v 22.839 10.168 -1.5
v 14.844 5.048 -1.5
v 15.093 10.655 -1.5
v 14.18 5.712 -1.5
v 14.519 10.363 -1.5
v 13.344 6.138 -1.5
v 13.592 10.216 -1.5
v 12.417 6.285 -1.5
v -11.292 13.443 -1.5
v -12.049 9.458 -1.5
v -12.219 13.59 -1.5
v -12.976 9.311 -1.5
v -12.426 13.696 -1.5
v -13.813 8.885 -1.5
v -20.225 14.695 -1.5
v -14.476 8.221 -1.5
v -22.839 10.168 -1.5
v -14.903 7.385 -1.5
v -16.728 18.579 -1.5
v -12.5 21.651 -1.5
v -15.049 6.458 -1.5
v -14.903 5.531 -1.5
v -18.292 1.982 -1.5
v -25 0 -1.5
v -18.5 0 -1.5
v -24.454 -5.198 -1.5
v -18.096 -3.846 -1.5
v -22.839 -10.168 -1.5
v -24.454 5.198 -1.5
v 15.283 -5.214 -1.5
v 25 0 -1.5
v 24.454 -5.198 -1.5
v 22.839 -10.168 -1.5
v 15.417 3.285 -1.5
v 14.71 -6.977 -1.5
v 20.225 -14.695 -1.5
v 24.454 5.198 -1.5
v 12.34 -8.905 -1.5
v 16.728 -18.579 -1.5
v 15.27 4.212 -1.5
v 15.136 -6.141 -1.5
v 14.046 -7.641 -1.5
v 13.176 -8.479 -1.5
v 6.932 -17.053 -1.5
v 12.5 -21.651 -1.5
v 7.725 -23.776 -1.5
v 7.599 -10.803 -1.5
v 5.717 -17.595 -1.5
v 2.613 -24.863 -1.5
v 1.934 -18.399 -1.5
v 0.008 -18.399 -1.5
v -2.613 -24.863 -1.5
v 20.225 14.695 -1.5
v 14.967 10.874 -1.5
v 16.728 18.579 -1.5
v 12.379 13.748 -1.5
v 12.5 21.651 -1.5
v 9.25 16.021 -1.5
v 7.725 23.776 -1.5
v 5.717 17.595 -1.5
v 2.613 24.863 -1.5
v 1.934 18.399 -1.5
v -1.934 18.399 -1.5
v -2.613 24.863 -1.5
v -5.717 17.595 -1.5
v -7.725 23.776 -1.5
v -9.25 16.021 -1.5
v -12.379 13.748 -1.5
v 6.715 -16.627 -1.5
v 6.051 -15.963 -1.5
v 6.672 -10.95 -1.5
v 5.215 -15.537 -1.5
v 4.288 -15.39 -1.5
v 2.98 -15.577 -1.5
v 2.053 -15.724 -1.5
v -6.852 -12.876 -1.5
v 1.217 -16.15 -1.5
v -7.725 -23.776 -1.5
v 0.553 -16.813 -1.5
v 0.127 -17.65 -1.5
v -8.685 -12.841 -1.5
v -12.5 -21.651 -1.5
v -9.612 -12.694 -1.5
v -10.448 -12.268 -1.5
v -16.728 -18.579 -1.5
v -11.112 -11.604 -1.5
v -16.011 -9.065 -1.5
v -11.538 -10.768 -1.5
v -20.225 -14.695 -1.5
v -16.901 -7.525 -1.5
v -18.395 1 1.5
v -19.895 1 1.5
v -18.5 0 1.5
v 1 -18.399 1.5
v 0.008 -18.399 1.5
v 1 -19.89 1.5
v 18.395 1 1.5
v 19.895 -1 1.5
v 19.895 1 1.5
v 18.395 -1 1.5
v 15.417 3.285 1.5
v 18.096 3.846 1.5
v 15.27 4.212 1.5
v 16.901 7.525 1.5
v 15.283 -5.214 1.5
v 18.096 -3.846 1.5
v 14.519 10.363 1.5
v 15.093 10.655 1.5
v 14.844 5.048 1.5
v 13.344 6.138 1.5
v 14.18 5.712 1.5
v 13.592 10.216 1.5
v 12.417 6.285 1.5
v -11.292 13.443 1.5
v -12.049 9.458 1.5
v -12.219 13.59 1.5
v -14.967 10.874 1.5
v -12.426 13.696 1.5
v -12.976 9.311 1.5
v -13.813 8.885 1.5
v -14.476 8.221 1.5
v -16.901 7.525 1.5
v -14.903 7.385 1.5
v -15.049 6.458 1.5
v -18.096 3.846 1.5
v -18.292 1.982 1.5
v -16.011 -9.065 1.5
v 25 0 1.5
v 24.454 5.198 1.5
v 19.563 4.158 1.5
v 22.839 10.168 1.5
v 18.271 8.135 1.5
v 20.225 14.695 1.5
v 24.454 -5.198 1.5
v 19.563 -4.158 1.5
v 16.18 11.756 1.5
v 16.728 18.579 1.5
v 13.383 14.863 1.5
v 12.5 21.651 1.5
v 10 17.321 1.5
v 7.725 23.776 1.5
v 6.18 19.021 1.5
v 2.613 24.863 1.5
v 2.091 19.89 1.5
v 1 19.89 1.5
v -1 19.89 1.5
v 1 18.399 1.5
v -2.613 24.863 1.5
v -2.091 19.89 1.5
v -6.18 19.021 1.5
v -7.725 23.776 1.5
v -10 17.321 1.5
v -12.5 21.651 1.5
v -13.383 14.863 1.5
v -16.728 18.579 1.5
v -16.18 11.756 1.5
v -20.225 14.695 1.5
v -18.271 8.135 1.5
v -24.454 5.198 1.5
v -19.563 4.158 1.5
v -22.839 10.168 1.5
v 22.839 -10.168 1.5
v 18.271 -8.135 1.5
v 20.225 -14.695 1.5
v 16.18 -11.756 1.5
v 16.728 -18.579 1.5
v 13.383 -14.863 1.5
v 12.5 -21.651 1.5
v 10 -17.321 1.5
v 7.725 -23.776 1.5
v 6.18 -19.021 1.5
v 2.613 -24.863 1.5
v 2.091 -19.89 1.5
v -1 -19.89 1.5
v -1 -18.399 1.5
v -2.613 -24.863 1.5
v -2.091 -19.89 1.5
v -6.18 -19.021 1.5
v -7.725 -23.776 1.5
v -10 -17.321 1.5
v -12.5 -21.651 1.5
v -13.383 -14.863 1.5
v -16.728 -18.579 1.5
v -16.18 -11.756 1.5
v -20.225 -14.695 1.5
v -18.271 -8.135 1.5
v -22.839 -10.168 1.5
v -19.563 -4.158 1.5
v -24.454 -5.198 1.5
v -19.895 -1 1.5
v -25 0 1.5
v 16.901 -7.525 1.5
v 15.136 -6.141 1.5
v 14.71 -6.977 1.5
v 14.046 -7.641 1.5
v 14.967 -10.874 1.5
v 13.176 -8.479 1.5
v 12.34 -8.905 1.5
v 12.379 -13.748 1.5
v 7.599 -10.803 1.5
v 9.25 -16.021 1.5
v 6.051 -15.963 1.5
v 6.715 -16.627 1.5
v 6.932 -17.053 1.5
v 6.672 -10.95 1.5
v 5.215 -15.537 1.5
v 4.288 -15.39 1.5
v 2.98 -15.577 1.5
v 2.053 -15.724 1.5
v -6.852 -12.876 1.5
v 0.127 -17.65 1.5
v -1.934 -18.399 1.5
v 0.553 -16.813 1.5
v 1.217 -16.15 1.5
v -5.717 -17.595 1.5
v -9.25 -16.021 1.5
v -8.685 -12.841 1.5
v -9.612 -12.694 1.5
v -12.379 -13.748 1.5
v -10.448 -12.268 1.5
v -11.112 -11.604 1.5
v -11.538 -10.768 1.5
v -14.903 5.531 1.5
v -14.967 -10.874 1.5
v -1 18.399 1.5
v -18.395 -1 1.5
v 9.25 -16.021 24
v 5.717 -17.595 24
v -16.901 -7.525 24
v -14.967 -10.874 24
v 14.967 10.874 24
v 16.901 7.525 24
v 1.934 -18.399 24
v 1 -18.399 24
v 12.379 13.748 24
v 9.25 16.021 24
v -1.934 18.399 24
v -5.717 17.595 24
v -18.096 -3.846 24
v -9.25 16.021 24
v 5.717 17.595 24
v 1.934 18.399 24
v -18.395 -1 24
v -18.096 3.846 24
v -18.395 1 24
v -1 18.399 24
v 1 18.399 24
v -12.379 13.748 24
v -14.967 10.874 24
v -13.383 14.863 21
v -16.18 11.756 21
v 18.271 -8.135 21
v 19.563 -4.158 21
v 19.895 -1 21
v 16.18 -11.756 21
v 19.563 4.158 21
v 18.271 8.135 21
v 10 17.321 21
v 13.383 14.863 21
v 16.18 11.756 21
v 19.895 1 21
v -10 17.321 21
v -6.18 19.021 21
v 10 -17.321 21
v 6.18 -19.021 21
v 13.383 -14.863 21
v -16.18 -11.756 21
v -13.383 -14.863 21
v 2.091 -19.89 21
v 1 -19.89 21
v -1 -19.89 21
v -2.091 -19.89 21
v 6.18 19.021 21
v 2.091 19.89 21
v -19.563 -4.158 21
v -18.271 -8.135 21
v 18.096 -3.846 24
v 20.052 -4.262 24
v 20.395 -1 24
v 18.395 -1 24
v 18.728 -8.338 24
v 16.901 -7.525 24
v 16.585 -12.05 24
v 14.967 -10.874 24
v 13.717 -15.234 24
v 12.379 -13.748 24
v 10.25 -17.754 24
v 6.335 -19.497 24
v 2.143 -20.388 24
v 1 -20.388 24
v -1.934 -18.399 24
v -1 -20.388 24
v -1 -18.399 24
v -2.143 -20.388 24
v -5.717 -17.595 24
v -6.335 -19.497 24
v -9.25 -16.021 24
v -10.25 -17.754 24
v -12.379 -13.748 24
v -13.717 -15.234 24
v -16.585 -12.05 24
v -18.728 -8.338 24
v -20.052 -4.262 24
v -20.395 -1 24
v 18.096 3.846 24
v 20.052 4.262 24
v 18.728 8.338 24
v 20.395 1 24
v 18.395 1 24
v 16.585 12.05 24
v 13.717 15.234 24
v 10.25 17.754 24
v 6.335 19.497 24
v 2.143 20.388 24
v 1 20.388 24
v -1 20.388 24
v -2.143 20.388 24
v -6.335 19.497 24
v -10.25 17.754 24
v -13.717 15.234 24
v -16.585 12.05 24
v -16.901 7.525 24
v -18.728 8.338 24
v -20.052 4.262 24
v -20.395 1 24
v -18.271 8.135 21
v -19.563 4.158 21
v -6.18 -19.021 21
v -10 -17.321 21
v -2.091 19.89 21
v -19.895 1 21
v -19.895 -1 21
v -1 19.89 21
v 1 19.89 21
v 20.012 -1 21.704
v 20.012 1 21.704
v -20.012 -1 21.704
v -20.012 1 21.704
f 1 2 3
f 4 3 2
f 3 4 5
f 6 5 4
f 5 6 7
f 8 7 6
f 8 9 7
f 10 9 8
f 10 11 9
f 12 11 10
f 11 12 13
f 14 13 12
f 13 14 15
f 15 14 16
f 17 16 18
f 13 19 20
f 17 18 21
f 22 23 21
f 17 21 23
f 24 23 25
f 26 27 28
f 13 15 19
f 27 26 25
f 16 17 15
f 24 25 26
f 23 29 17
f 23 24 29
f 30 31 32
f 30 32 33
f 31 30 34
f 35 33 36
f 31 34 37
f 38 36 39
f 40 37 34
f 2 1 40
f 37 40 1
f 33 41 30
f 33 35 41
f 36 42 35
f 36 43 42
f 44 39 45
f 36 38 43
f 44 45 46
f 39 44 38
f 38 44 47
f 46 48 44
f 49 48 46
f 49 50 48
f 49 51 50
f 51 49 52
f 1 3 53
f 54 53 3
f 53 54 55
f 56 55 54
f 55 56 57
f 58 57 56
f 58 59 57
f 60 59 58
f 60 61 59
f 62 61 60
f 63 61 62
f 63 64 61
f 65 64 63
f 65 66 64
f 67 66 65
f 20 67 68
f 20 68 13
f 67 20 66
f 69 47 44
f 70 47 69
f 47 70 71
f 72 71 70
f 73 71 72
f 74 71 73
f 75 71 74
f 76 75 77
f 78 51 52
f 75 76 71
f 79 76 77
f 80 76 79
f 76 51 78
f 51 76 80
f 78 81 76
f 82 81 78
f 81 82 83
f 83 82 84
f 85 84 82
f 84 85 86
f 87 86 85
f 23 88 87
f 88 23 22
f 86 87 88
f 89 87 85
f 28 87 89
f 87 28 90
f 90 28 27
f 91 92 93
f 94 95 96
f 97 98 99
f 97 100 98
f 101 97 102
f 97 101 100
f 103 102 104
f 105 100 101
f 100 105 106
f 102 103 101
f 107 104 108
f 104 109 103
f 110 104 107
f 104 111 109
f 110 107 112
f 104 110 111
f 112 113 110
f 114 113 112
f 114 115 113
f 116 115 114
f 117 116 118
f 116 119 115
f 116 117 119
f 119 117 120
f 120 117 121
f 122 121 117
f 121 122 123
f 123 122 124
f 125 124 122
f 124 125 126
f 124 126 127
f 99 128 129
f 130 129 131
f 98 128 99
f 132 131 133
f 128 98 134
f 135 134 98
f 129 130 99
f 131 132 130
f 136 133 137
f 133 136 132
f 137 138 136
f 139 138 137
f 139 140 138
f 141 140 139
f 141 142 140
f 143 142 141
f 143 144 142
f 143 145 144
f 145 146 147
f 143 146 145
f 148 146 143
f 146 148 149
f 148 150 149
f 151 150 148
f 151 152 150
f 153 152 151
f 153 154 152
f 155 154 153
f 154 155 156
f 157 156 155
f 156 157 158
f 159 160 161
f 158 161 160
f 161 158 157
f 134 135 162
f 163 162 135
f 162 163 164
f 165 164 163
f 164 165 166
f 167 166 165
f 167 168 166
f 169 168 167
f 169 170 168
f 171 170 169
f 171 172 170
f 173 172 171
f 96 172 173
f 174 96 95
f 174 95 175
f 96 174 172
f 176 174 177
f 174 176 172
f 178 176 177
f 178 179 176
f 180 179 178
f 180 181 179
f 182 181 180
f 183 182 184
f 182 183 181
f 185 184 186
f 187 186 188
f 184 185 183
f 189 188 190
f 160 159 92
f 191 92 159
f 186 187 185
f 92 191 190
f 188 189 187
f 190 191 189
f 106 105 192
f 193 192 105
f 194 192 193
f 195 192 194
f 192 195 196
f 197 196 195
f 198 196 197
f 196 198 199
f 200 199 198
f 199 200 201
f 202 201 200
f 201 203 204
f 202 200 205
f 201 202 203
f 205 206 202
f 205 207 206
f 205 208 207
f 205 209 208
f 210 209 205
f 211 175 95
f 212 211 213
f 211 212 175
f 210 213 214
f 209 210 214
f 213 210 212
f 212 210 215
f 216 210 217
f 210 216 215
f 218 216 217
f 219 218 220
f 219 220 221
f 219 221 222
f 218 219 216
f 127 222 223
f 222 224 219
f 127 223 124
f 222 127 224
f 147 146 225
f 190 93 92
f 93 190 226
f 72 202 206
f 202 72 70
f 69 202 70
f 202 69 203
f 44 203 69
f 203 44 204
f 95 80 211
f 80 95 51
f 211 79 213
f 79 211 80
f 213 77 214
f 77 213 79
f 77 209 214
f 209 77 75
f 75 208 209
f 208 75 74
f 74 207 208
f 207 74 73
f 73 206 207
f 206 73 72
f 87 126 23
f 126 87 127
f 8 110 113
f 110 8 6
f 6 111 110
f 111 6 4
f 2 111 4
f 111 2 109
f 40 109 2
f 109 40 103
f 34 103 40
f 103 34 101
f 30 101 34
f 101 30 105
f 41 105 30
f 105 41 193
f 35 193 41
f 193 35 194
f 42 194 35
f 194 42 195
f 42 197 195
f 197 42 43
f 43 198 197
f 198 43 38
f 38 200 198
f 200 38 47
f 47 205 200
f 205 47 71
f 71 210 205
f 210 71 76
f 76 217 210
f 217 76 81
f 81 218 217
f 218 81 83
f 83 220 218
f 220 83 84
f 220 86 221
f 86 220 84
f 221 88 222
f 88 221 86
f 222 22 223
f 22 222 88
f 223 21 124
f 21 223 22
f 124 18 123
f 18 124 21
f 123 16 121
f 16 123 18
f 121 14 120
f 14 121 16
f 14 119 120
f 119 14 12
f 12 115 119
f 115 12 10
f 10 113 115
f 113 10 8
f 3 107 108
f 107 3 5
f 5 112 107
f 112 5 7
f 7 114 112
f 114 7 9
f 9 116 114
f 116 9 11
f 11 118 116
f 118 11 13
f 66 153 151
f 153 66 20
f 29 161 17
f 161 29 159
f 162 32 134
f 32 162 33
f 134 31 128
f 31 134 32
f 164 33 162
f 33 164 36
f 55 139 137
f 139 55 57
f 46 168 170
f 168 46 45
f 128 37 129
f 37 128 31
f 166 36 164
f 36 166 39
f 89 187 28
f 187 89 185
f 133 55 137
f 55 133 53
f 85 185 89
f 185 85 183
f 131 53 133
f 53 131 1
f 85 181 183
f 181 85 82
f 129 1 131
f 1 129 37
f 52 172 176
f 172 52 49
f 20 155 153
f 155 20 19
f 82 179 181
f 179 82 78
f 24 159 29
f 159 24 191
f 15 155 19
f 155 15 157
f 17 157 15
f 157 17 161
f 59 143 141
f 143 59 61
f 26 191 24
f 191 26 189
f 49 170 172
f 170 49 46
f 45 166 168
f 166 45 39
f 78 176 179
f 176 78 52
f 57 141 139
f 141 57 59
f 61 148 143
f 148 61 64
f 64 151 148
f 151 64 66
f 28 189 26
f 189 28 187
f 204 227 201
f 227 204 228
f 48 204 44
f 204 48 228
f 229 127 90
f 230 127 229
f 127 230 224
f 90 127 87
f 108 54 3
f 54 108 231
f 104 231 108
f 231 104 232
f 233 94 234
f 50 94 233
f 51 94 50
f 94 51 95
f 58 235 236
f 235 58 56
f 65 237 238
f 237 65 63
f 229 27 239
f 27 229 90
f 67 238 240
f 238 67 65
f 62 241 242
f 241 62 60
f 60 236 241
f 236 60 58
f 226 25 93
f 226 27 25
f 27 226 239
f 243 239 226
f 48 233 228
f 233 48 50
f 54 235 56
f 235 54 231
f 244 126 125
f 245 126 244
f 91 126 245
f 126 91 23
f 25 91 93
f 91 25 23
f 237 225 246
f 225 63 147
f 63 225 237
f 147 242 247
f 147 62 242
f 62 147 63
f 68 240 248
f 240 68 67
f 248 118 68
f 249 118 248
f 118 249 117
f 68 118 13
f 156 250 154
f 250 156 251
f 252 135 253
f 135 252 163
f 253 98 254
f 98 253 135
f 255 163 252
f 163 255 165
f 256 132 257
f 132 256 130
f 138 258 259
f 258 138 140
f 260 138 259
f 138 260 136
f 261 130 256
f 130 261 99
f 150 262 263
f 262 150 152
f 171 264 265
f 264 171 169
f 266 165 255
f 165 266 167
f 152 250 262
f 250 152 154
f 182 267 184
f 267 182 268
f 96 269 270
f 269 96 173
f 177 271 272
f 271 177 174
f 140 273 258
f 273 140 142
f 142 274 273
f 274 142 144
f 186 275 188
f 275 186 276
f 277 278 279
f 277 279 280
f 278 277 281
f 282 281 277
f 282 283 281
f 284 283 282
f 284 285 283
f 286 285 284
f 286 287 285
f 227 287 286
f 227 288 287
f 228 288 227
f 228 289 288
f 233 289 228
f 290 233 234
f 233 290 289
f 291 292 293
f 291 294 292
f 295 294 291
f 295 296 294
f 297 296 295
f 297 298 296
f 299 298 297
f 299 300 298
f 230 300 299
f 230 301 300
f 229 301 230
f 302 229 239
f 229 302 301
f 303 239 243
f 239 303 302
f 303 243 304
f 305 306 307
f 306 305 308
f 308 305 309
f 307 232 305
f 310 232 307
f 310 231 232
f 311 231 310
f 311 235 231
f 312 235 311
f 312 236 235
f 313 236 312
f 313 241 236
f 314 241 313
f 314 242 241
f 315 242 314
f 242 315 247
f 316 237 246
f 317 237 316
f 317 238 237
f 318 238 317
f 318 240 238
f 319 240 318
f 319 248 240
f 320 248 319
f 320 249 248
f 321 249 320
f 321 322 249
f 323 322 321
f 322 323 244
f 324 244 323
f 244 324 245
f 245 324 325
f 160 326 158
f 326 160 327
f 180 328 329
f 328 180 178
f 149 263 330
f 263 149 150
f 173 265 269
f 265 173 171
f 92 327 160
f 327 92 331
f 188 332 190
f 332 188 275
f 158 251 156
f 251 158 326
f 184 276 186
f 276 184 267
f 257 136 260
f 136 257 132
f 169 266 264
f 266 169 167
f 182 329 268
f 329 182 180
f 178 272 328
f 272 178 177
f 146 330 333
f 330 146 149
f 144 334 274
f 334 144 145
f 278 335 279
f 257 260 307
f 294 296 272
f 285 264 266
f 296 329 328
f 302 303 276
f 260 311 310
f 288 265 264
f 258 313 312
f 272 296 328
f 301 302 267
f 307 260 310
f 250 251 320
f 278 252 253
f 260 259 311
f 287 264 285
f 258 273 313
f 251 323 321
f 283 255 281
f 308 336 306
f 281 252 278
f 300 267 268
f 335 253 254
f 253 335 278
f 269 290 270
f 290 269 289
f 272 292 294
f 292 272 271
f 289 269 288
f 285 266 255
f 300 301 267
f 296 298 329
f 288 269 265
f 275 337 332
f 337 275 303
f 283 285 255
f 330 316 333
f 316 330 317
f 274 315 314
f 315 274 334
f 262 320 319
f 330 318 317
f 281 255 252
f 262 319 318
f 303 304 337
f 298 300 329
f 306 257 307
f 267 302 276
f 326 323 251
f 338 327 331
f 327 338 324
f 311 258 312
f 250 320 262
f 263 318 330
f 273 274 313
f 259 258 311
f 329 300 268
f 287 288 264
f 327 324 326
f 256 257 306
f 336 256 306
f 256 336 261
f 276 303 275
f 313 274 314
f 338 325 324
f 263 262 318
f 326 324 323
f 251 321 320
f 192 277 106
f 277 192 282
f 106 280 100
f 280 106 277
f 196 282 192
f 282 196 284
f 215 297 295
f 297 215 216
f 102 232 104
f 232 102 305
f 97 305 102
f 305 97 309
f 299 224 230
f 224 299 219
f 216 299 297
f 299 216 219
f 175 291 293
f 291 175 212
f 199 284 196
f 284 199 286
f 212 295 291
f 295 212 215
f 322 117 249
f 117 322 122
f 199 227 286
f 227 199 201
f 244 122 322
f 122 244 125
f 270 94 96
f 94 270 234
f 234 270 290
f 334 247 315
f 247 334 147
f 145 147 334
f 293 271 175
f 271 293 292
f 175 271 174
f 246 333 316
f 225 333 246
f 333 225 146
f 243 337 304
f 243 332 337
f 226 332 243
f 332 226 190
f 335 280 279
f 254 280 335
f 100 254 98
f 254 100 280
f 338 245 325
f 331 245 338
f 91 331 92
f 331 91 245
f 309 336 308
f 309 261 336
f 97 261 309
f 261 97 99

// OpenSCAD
// Opening of your vent
ventopening = 40;
// Thickness of the material through which the vent goes
materialthickness = 18;
// Size of the border frame outside the vent
border = 5;
// Thickness of the walls
wallthickness = 3;
// Size of the ring that snaps the vent in place
snapringthickness = 1;
// Seed in case you want to have a specific pattern
seed =  undef;

rotate([180,0,0])
union () {
  difference() {
    cylinder(d=ventopening + border,h=wallthickness,center=true);
    translate([0,0,-2*wallthickness]) linear_extrude(5*wallthickness)
      random_voronoi(n = pow(ventopening/9,2), nuclei = false, L = ventopening, thickness = 2, round = 3, min = 0, max = 100, seed = seed, center = true);
  }
  difference() {
    cylinder(d=ventopening+2*border, h=wallthickness,center=true);
    cylinder(d=ventopening-wallthickness, h=wallthickness+1,center=true);
  }

  translate([0, 0, -0.5*(materialthickness+2*wallthickness)])
    difference() {
      union() {
        cylinder(d=ventopening, h=(materialthickness+2*wallthickness),center=true);
        translate([0,0,-0.5*(materialthickness+2*wallthickness)+0.5*wallthickness])
          cylinder(d2=ventopening,d1=ventopening+snapringthickness, h=wallthickness,center=true);
      }
      cylinder(d=ventopening-wallthickness, h=(materialthickness+2*wallthickness)+1,center=true);
      cube([2,ventopening+2*border,(materialthickness+2*wallthickness)+1],center=true);
      cube([ventopening+2*border,2,(materialthickness+2*wallthickness)+1],center=true);
    }


}


// (c)2013 Felipe Sanches <juca@members.fsf.org>
// licensed under the terms of the GNU GPL version 3 (or later)

function normalize(v) = v / (sqrt(v[0] * v[0] + v[1] * v[1]));

//
// The voronoi() function generates a 2D surface, which can be provided to
// a) linear_extrude() to produce a 3D object
// b) intersection() to restrict it to a a specified shape -- see voronoi_polygon.scad
//
// Parameters:
//   points (required) ... nuclei coordinates (array of [x, y] pairs)
//   L                 ... the radius of the "world" (the pattern is built within this circle)
//   thickness         ... the thickness of the lines between cells
//   round             ... the radius applied to corners (fillet in CAD terms)
//   nuclei (bool)     ... show nuclei sites
//
// These parameters need to be kept more or less in proportion to each other, and to the distance
// apart of points in the point_set. If one or the other parameter is increased or decreased too
// much, you'll get no output.
//
module voronoi(points, L = 200, thickness = 1, round = 6, nuclei = true) {
	for (p = points) {
		difference() {
			minkowski() {
				intersection_for(p1 = points){
					if (p != p1) {
						angle = 90 + atan2(p[1] - p1[1], p[0] - p1[0]);

						translate((p + p1) / 2 - normalize(p1 - p) * (thickness + round))
						rotate([0, 0, angle])
						translate([-L, -L])
						square([2 * L, L]);
					}
				}
				circle(r = round, $fn = 20);
			}
			if (nuclei)
				translate(p) circle(r = 1, $fn = 20);
		}
	}
}

//
// The random_voronoi() function is the helper wrapper over the voronoi() core.
// It generates random nuclei site coordinates into the square area,
// passing other arguments to voronoi() unchanged.
//
// Parameters:
//   n                 ... number of nuclei sites to be generated
//   nuclei (bool)     ... show nuclei sites
//   L                 ... the radius of the "world" (the pattern is built within this circle)
//   thickness         ... the thickness of the lines between cells
//   round             ... the radius applied to corners (fillet in CAD terms)
//   min               ... minimum x and y coordinate for nuclei generation
//   max               ... maximum x and y coordinate for nuclei generation
//   seed              ... seed for the random generator (random if undefined)
//   center (bool)     ... move resulting pattern to [0, 0] if true
//
module random_voronoi(n = 20, nuclei = true, L = 200, thickness = 1, round = 6, min = 0, max = 100, seed = undef, center = false) {
	seed = seed == undef ? rands(0, 100, 1)[0] : seed;
	echo("Seed", seed);

	// Generate points.
	x = rands(min, max, n, seed);
	y = rands(min, max, n, seed + 1);
	points = [ for (i = [0 : n - 1]) [x[i], y[i]] ];

	// Center Voronoi.
	offset_x = center ? -(max(x) - min(x)) / 2 : 0;
	offset_y = center ? -(max(y) - min(y)) / 2 : 0;
	translate([offset_x, offset_y])

	voronoi(points, L = L, thickness = thickness, round = round, nuclei = nuclei);
}
